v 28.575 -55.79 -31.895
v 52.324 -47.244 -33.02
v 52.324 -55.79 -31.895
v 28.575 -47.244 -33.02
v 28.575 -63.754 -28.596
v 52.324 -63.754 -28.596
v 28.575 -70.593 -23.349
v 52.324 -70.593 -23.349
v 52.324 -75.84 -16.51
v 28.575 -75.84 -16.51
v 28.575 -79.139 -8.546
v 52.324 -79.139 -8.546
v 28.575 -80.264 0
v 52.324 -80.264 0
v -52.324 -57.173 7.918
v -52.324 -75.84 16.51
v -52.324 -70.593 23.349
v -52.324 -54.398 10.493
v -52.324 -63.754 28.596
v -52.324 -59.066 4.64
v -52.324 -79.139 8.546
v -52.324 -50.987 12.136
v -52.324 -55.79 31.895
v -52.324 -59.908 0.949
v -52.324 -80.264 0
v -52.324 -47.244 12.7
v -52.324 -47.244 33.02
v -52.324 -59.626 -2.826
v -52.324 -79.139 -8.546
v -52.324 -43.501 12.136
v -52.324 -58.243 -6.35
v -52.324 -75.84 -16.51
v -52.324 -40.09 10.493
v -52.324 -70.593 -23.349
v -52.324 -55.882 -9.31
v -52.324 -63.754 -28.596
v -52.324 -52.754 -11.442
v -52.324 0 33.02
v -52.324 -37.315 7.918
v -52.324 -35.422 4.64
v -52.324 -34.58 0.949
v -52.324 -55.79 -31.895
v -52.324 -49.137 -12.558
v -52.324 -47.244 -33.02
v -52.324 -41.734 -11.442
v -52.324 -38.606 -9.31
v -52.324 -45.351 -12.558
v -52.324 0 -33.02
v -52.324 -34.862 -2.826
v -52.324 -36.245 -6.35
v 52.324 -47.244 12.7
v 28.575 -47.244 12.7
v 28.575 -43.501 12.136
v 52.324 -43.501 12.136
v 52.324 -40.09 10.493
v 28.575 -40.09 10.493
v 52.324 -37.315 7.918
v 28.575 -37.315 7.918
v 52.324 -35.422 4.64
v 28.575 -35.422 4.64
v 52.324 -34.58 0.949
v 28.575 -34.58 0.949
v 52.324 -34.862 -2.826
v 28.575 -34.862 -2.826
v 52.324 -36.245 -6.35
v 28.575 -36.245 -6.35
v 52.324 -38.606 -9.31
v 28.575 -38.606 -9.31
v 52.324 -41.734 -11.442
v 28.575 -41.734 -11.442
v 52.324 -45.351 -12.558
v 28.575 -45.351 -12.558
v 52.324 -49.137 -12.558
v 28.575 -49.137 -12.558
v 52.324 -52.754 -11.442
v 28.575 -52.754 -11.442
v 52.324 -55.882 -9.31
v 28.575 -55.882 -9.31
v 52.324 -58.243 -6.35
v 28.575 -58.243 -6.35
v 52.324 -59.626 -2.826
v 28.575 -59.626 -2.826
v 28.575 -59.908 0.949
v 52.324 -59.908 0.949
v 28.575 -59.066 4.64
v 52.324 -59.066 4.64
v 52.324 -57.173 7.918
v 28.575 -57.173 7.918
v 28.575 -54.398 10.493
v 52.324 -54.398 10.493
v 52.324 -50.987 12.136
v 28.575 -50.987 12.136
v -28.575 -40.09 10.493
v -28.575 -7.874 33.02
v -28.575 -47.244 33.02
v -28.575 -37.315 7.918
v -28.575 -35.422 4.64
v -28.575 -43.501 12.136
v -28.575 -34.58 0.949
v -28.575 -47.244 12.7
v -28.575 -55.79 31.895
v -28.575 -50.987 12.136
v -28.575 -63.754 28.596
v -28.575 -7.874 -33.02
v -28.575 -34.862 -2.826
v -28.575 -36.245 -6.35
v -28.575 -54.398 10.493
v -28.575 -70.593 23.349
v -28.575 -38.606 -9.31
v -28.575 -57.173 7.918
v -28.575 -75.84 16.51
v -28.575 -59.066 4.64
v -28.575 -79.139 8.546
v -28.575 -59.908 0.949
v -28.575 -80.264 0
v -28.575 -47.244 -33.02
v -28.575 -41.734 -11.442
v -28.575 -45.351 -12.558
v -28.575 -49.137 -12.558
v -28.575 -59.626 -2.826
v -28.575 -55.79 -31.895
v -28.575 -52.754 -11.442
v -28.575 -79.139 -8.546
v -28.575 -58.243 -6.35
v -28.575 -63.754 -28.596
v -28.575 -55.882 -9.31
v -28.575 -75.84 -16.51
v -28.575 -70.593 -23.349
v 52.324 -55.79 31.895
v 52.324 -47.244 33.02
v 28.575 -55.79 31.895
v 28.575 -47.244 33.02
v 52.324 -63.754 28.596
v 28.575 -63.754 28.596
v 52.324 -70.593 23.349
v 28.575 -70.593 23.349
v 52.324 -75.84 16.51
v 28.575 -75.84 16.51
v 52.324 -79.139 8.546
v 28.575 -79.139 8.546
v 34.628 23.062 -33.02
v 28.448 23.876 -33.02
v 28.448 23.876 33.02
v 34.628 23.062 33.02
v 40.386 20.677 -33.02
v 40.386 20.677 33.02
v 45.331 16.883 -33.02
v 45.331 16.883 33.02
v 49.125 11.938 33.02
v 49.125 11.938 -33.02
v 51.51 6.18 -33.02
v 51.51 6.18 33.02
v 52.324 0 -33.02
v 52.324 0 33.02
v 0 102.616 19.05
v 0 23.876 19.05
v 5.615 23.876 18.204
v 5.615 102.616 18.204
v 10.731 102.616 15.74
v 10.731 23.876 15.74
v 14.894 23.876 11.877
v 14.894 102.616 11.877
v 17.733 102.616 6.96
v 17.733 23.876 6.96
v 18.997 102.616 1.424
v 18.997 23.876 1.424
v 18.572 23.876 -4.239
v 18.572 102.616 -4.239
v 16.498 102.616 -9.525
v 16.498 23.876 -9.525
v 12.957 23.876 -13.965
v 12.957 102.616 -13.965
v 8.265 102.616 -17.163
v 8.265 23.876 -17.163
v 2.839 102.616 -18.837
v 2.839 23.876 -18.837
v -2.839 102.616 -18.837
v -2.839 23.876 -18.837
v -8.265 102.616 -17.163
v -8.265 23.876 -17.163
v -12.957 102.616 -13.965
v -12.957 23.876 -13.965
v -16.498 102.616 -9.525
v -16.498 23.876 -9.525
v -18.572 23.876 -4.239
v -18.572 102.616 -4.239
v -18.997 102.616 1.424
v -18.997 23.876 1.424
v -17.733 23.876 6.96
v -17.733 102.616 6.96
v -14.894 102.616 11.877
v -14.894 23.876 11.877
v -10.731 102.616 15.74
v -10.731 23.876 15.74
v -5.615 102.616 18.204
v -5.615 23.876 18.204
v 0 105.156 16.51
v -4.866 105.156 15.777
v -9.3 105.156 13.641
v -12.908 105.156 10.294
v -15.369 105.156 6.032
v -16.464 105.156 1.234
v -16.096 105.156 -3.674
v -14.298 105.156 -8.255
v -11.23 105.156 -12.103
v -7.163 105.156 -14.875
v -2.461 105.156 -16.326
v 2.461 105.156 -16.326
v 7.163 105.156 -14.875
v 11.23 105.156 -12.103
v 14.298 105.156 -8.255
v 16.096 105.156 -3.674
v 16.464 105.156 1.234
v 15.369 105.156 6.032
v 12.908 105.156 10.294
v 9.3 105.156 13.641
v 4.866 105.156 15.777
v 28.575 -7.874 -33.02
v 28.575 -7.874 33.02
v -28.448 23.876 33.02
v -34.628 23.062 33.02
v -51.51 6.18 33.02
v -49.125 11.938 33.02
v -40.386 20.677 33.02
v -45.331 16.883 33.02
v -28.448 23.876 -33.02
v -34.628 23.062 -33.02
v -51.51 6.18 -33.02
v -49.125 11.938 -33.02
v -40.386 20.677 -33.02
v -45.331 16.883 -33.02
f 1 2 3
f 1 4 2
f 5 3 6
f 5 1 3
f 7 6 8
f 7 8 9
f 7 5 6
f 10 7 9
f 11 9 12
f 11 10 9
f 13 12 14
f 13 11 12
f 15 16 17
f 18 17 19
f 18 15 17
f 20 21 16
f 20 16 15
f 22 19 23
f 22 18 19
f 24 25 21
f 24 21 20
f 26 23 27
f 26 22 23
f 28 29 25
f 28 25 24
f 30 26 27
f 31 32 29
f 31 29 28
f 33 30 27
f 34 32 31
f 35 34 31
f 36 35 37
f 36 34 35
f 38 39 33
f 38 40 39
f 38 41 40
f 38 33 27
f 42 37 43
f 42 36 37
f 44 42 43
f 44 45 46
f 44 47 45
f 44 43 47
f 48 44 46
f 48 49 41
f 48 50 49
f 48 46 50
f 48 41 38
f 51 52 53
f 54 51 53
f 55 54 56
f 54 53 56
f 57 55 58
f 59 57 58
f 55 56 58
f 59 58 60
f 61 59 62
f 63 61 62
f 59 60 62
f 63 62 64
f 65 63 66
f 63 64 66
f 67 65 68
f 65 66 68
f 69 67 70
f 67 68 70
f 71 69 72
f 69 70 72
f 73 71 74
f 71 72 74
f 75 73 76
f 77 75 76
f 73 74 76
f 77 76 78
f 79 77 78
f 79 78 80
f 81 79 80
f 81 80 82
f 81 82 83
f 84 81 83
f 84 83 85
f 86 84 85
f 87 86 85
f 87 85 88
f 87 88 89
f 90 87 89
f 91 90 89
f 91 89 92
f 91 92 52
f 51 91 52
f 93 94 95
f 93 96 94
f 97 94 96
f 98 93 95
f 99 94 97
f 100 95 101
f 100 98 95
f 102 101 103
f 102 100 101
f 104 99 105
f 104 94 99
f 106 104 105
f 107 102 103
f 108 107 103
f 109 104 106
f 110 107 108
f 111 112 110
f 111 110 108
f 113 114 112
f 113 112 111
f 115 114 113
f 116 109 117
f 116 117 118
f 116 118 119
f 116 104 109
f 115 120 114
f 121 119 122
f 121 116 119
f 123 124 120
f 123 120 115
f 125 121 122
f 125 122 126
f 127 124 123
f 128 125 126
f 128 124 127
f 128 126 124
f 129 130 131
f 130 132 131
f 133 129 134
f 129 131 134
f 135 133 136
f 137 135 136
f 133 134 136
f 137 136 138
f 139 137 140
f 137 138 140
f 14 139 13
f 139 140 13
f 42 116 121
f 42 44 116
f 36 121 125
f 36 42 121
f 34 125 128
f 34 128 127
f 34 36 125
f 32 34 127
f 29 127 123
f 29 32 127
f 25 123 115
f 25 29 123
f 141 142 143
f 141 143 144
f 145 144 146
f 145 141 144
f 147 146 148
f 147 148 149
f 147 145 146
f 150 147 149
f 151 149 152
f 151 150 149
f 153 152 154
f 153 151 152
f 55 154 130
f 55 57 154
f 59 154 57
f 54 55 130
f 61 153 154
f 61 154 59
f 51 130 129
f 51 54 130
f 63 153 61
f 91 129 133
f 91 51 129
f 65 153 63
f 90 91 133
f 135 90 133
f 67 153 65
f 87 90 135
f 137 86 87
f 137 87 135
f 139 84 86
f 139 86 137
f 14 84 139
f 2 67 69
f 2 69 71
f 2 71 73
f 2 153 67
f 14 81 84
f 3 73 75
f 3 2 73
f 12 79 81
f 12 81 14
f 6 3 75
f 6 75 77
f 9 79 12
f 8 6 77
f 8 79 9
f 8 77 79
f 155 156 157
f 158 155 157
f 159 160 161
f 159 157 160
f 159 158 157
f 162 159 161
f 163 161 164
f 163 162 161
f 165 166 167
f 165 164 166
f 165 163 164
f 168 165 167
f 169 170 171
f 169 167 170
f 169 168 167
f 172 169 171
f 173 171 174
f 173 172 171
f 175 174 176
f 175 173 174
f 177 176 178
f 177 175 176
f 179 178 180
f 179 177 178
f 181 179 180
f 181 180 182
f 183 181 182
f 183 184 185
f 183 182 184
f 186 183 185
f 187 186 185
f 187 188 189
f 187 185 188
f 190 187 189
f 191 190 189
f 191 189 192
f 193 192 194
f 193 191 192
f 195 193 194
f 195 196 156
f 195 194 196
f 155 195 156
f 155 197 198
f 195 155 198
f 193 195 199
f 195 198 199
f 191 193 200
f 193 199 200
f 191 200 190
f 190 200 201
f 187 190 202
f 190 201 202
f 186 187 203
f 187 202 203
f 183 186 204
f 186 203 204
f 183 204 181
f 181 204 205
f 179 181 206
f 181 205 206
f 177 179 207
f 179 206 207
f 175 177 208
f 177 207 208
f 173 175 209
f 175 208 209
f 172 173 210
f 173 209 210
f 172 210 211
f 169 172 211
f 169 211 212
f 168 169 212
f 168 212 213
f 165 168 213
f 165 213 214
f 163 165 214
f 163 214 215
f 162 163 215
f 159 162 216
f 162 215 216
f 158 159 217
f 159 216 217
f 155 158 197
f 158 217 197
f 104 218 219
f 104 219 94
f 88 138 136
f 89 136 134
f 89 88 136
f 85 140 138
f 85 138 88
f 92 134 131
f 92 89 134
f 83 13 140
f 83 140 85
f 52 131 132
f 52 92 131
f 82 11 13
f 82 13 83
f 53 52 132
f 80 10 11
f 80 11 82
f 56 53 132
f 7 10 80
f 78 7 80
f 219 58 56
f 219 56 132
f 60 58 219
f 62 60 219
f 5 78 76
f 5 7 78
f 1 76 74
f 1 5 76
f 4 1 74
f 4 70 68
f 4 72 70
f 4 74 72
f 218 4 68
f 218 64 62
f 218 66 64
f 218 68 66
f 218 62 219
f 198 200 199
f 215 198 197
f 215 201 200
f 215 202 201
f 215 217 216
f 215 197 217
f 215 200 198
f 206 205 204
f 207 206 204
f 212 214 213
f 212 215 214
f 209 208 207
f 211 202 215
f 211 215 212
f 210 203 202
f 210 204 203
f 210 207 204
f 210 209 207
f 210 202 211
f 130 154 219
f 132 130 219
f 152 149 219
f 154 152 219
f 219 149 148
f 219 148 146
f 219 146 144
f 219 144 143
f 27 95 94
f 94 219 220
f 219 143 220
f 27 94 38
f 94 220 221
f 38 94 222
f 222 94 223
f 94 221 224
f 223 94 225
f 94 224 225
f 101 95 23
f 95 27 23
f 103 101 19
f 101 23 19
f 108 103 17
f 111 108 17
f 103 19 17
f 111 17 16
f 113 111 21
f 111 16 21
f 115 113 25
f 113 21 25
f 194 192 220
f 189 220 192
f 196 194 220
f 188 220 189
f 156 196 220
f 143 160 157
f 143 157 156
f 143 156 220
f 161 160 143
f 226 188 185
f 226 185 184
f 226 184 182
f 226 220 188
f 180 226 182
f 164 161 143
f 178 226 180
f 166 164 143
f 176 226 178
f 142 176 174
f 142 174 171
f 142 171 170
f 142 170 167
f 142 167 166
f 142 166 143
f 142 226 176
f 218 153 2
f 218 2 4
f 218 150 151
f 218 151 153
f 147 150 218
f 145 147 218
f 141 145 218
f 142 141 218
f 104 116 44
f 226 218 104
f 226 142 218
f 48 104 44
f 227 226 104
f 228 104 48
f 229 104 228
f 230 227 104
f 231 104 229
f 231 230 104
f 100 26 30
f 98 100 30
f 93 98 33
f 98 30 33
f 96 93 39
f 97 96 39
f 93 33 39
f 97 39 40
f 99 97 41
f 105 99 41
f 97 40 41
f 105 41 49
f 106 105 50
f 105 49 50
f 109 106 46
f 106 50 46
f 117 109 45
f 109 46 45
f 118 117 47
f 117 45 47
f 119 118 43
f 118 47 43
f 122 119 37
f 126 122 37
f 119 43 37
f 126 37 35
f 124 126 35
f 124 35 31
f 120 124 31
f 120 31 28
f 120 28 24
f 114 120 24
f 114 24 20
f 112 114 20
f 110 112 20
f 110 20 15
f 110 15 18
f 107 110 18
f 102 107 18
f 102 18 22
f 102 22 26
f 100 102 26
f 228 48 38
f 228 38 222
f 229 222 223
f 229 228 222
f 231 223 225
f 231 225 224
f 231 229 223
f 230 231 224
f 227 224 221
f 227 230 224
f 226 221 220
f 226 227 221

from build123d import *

# Parameters (mm, degrees)
BOSS_EXTRUDE1_DEPTH      = 33.02
BOSS_EXTRUDE1_DEPTH_BACK = 33.02
BOSS_EXTRUDE3_DEPTH      = 19.05
BOSS_EXTRUDE3_DEPTH_BACK = 19.05
SKETCH2_6_W              = 38.1
SKETCH2_6_H              = 81.28
SKETCH8_OUTSIDE_W        = 151.232
SKETCH8_OUTSIDE_H        = 112.624
SKETCH8_OUTSIDE_R        = 19.05
CUT_EXTRUDE1_DEPTH       = 81.28
CHAMFER2_SIZE            = 2.54
FILLET2_R                = 33.02
HOLE1_D                  = 25.4


with BuildPart() as part:
    # Sketch2 → Boss-Extrude1 (new, two sides: drawn at the far end of the back side and taken through both)
    with BuildSketch(Plane.XY.offset(-BOSS_EXTRUDE1_DEPTH_BACK)):
        with BuildLine():
            ThreePointArc((-52.324, 0), (-45.330881508, 16.882881508), (-28.448, 23.876))
            Line((-28.448, 23.876), (28.448, 23.876))
            ThreePointArc((28.448, 23.876), (45.330881508, 16.882881508), (52.324, 0))
            Line((52.324, 0), (52.324, -80.264))
            Line((52.324, -80.264), (28.575, -80.264))
            Line((28.575, -80.264), (28.575, -7.874))
            Line((28.575, -7.874), (-28.575, -7.874))
            Line((-28.575, -7.874), (-28.575, -80.264))
            Line((-28.575, -80.264), (-52.324, -80.264))
            Line((-52.324, -80.264), (-52.324, 0))
        make_face()
    extrude(amount=BOSS_EXTRUDE1_DEPTH + BOSS_EXTRUDE1_DEPTH_BACK)

    # Sketch2<6> → Boss-Extrude3 (add, two sides: drawn at the far end of the back side and taken through both)
    with BuildSketch(Plane.XY.offset(-BOSS_EXTRUDE3_DEPTH_BACK)):
        with Locations((0, 64.516)):
            Rectangle(SKETCH2_6_W, SKETCH2_6_H)
    extrude(amount=BOSS_EXTRUDE3_DEPTH + BOSS_EXTRUDE3_DEPTH_BACK)

    # Sketch8 outside → Cut-Extrude1 (cut)
    with BuildSketch(Plane(origin=(0, 105.156, 0), x_dir=(1, 0, 0), z_dir=(0, 1, 0))):
        Rectangle(SKETCH8_OUTSIDE_W, SKETCH8_OUTSIDE_H)
        with Locations(Location((0, 0, 0), (0, 0, 270))):
            Circle(SKETCH8_OUTSIDE_R, mode=Mode.SUBTRACT)
    extrude(amount=-CUT_EXTRUDE1_DEPTH, mode=Mode.SUBTRACT)

    # Chamfer2
    chamfer2_edges = [part.edges().sort_by_distance(p)[0] for p in [
        (0, 105.156, -19.05),
    ]]
    chamfer(chamfer2_edges, length=CHAMFER2_SIZE)

    # Fillet2
    fillet2_edges = [part.edges().sort_by_distance(p)[0] for p in [
        (-40.4495, -80.264, -33.02),
        (40.4495, -80.264, -33.02),
        (40.4495, -80.264, 33.02),
        (-40.4495, -80.264, 33.02),
    ]]
    fillet(fillet2_edges, radius=FILLET2_R - 0.0001)  # a hair under: the kernel refuses the full size

    # Hole1 (through all)
    with Locations(Plane(origin=(52.324, 0, 0), x_dir=(0, 0, -1), z_dir=(1, 0, 0))):
        with Locations((0, -47.244)):
            Hole(HOLE1_D / 2)


solid = part.part
